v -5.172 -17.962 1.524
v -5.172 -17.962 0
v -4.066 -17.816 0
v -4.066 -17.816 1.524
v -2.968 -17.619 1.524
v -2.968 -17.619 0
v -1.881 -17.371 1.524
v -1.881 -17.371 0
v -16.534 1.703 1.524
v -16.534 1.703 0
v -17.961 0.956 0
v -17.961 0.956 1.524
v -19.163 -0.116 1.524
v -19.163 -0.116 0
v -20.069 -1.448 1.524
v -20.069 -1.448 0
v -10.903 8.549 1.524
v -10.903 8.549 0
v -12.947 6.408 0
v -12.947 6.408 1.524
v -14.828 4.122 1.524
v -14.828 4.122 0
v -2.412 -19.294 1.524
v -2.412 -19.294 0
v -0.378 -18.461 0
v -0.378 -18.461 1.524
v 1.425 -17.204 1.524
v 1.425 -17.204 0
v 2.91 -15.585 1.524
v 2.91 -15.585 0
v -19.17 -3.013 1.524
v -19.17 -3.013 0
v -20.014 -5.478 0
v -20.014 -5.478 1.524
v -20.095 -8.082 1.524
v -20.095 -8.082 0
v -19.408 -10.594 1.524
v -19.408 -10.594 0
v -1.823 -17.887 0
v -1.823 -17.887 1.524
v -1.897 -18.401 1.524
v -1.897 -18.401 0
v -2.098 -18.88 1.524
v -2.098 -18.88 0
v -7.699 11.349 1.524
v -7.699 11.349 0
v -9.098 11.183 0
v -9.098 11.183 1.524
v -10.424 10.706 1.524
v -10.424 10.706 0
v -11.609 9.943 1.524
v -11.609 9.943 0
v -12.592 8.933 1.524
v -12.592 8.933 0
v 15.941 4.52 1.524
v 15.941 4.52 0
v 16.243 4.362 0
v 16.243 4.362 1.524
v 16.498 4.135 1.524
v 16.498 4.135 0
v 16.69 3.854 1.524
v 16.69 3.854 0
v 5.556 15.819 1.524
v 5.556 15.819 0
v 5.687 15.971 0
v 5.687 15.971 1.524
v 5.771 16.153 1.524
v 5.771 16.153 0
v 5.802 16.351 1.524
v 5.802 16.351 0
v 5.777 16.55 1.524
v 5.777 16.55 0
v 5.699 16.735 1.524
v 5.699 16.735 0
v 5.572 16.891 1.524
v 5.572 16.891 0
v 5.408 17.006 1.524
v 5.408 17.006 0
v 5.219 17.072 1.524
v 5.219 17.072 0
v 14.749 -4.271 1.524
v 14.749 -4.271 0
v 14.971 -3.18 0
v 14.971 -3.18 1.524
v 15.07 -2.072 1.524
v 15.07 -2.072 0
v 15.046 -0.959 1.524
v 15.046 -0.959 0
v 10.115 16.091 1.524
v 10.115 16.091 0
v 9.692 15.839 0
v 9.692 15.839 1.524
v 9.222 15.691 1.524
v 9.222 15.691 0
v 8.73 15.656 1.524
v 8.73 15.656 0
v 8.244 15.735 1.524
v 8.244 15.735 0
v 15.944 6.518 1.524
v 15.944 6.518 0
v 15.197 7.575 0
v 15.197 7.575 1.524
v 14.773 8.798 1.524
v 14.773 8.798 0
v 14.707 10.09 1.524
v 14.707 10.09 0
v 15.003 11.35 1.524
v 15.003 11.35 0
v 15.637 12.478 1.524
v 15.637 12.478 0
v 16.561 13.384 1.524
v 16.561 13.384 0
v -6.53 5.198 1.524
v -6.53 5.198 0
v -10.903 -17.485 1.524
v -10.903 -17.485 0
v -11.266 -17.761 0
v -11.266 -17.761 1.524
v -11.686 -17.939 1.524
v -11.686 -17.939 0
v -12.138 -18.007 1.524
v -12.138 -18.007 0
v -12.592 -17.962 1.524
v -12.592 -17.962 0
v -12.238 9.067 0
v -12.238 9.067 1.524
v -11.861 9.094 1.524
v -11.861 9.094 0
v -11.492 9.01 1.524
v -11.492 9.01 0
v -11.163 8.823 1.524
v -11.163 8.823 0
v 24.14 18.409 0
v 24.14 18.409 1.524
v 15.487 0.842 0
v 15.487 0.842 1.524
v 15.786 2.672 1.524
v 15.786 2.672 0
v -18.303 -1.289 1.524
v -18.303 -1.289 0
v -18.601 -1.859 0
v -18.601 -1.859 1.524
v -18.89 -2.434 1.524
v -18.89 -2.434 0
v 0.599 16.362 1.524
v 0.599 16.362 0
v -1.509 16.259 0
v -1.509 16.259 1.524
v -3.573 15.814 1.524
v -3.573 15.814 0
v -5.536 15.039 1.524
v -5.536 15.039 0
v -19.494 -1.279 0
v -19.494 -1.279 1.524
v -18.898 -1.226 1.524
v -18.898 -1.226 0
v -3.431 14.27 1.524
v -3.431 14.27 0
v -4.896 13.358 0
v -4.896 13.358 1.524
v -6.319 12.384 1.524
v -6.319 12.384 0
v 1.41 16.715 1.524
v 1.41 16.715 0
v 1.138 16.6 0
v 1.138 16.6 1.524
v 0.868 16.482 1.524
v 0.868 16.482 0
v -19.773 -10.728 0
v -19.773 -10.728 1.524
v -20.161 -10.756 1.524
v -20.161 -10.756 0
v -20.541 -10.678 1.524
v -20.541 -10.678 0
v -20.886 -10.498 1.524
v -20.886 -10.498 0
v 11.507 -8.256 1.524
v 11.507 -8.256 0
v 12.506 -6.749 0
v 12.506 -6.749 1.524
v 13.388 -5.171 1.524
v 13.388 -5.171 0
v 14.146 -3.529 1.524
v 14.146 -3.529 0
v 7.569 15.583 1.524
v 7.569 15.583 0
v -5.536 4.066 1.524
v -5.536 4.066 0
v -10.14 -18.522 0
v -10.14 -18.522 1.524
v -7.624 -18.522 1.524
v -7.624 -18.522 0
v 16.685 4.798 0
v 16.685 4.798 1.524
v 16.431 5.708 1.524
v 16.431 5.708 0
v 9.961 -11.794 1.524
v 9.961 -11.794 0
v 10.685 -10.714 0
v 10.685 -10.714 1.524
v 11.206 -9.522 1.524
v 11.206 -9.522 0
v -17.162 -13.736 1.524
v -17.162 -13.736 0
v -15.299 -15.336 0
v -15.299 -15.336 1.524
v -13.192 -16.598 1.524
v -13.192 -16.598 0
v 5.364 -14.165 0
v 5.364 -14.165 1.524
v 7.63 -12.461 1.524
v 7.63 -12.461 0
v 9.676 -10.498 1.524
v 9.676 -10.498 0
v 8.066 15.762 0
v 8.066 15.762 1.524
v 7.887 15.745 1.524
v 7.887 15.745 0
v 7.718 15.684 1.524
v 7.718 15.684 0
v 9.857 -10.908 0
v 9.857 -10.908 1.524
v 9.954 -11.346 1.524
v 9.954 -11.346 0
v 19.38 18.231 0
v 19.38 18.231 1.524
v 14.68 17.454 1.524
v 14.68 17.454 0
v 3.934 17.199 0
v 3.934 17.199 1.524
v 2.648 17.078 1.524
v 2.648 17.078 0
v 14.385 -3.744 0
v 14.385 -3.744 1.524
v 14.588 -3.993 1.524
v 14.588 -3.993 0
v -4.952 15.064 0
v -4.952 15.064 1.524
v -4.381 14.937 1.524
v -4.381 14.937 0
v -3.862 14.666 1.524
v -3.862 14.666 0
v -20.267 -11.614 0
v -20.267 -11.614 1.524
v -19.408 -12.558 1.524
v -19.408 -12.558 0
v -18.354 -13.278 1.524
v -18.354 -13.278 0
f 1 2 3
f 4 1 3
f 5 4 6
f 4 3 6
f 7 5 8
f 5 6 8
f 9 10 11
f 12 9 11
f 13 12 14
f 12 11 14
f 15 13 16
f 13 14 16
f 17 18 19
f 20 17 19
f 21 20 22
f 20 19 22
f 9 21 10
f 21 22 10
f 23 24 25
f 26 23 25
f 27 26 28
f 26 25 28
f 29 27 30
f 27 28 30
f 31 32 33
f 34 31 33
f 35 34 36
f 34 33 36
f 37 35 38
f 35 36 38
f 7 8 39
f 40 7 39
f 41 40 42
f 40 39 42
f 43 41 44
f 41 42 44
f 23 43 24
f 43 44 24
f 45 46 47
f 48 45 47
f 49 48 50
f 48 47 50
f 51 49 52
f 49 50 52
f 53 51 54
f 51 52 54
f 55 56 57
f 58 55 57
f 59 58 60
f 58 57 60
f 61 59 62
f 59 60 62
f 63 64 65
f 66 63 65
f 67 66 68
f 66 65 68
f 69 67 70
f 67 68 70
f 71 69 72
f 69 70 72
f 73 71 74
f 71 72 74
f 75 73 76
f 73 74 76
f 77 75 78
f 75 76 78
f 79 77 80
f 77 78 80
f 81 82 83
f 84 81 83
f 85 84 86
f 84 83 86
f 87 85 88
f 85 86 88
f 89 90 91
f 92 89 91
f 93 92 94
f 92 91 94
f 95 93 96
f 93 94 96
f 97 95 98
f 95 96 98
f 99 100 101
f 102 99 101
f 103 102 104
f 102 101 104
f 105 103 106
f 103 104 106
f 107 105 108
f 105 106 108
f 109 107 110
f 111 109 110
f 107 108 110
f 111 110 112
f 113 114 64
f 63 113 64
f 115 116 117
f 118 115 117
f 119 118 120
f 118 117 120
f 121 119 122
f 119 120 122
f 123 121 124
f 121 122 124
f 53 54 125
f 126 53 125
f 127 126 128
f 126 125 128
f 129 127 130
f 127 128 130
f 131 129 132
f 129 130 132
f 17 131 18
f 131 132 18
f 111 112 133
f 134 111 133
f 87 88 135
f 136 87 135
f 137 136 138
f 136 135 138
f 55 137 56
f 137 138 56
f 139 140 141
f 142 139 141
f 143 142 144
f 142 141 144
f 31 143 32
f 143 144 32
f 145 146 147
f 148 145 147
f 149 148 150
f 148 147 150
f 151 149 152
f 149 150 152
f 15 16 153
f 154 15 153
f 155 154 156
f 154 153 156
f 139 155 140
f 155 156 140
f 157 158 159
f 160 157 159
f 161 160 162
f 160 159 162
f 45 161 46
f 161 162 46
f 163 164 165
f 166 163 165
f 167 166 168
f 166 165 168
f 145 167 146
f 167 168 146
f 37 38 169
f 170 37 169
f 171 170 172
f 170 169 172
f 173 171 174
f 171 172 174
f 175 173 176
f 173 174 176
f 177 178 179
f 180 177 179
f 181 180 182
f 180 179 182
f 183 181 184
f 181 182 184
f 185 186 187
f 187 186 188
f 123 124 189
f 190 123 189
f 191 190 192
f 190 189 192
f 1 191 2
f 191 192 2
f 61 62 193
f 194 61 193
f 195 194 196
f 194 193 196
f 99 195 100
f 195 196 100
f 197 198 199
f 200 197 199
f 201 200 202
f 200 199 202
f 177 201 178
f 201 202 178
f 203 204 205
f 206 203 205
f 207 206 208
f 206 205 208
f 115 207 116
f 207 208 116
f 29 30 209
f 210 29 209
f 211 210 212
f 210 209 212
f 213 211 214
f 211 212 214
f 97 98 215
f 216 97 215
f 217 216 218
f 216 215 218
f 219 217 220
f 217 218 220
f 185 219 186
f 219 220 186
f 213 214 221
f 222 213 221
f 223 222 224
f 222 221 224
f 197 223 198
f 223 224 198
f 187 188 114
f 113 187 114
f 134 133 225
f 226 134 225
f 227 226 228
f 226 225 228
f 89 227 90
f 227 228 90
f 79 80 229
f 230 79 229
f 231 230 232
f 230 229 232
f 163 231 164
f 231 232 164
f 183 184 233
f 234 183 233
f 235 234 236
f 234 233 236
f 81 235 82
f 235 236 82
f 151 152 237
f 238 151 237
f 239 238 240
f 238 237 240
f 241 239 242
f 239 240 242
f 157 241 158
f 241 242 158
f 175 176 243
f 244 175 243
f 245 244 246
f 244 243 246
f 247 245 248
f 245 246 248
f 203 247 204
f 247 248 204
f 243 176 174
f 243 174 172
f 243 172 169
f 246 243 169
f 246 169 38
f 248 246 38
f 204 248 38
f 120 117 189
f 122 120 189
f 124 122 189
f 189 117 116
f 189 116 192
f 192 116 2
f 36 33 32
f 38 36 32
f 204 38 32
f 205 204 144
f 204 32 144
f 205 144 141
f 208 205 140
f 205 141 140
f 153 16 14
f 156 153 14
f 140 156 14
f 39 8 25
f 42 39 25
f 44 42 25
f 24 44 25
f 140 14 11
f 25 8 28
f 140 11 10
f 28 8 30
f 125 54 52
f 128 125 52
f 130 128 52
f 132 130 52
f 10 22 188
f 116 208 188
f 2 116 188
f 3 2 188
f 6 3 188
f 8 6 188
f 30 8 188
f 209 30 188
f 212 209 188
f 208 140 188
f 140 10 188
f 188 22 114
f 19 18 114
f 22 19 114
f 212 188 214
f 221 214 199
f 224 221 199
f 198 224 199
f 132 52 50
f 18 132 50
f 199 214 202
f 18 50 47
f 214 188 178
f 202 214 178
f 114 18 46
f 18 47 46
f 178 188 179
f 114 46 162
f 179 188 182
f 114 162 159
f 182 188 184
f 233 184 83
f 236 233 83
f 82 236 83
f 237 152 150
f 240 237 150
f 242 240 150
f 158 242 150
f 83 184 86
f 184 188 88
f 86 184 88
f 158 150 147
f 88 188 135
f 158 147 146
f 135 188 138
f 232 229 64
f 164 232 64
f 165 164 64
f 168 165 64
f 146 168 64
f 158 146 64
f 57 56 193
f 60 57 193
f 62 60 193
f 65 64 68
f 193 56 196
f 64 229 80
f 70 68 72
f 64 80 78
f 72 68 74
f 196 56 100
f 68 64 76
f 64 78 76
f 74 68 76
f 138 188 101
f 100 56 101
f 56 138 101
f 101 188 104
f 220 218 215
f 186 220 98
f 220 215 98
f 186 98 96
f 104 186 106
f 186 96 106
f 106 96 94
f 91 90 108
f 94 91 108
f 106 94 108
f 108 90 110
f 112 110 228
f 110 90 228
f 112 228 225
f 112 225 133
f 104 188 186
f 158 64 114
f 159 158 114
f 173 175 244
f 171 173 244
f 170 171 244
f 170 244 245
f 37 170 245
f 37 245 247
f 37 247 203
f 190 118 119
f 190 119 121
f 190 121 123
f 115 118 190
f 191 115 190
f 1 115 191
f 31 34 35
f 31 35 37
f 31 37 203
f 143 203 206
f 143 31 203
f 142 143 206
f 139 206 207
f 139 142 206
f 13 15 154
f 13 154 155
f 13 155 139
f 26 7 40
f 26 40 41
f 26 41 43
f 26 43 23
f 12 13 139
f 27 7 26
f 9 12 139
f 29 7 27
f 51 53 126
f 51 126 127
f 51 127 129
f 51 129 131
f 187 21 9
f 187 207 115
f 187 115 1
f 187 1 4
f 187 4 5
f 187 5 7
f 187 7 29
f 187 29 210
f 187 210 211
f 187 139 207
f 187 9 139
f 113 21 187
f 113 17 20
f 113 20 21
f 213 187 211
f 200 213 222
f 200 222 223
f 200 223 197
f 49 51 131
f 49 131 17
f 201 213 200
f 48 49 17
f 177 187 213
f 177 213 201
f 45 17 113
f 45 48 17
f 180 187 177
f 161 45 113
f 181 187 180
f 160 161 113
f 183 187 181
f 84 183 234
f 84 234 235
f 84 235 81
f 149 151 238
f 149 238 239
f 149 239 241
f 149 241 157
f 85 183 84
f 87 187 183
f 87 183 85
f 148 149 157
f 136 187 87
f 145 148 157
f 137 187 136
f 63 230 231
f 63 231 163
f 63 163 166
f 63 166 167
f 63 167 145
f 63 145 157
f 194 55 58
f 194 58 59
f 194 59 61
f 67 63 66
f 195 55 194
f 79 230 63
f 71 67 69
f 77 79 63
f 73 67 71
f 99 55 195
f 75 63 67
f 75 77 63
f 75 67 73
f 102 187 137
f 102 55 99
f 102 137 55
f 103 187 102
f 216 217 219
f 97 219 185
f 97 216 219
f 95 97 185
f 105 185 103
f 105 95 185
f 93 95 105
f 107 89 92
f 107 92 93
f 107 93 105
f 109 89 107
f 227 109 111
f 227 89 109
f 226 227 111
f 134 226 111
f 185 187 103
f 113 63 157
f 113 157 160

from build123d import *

# Parameters (mm, degrees)
BOSS_EXTRUDE1_DEPTH = 1.524


with BuildPart() as part:
    # Sketch1 → Boss-Extrude1 (new body)
    with BuildSketch(Plane.XY):
        with BuildLine():
            Line((7.568674397, 15.582558464), (-5.536256919, 4.066414385))
            Line((-5.536256919, 4.066414385), (-6.530313076, 5.198282058))
            Line((-6.530313076, 5.198282058), (5.556223507, 15.819133016))
            ThreePointArc((5.556223507, 15.819133016), (5.777089873, 16.550462951), (5.218621489, 17.071748372))
            ThreePointArc((5.218621489, 17.071748372), (3.288269389, 17.169456569), (1.409525645, 16.715443282))
            ThreePointArc((1.409525645, 16.715443282), (1.003306116, 16.541109193), (0.599038273, 16.362295908))
            ThreePointArc((0.599038273, 16.362295908), (-2.550127925, 16.078915888), (-5.536256919, 15.03940369))
            ThreePointArc((-5.536256919, 15.03940369), (-4.380758941, 14.936898454), (-3.431369122, 14.270308722))
            ThreePointArc((-3.431369122, 14.270308722), (-5.61253751, 12.87862193), (-7.699155785, 11.348814153))
            ThreePointArc((-7.699155785, 11.348814153), (-10.424357394, 10.705874365), (-12.591632165, 8.933019197))
            ThreePointArc((-12.591632165, 8.933019197), (-11.673431217, 9.06564735), (-10.902633402, 8.549358731))
            ThreePointArc((-10.902633402, 8.549358731), (-13.90878858, 5.282464583), (-16.534336918, 1.702511755))
            ThreePointArc((-16.534336918, 1.702511755), (-18.59519403, 0.456840392), (-20.068993111, -1.447561206))
            ThreePointArc((-20.068993111, -1.447561206), (-19.197525413, -1.237616175), (-18.302618639, -1.289333967))
            ThreePointArc((-18.302618639, -1.289333967), (-18.746738742, -2.146015126), (-19.170061319, -3.013161751))
            ThreePointArc((-19.170061319, -3.013161751), (-20.151793191, -6.776607347), (-19.40772228, -10.594156129))
            ThreePointArc((-19.40772228, -10.594156129), (-20.160576804, -10.75613538), (-20.886030658, -10.497786933))
            ThreePointArc((-20.886030658, -10.497786933), (-19.40772228, -12.558219915), (-17.161873617, -13.735905577))
            ThreePointArc((-17.161873617, -13.735905577), (-14.272607306, -16.011724419), (-10.902633402, -17.484981731))
            ThreePointArc((-10.902633402, -17.484981731), (-11.686238888, -17.939086495), (-12.591632165, -17.961707434))
            ThreePointArc((-12.591632165, -17.961707434), (-8.881936241, -18.592642939), (-5.172240316, -17.961707434))
            ThreePointArc((-5.172240316, -17.961707434), (-3.516074533, -17.724342682), (-1.880821012, -17.370544649))
            ThreePointArc((-1.880821012, -17.370544649), (-1.897285647, -18.401111131), (-2.412003394, -19.294085934))
            ThreePointArc((-2.412003394, -19.294085934), (0.557596733, -17.882208081), (2.910422529, -15.585224243))
            ThreePointArc((2.910422529, -15.585224243), (6.522466187, -13.346484728), (9.675834999, -10.497786933))
            ThreePointArc((9.675834999, -10.497786933), (9.916567514, -11.124520652), (9.960567596, -11.794454448))
            ThreePointArc((9.960567596, -11.794454448), (10.971969999, -10.129349123), (11.507200123, -8.256106139))
            ThreePointArc((11.507200123, -8.256106139), (12.962197209, -5.968399457), (14.145957127, -3.529274442))
            ThreePointArc((14.145957127, -3.529274442), (14.491523151, -3.864332581), (14.749497984, -4.270693035))
            ThreePointArc((14.749497984, -4.270693035), (15.035659281, -2.627123404), (15.04635356, -0.958862317))
            ThreePointArc((15.04635356, -0.958862317), (15.654704723, 1.754409987), (15.940567857, 4.520313094))
            ThreePointArc((15.940567857, 4.520313094), (16.377113792, 4.256299615), (16.690299619, 3.853571284))
            ThreePointArc((16.690299619, 3.853571284), (16.588539506, 5.261834916), (15.944497262, 6.518326526))
            ThreePointArc((15.944497262, 6.518326526), (14.706822394, 10.090010141), (16.56074466, 13.384207335))
            Line((16.56074466, 13.384207335), (24.140280678, 18.409177712))
            ThreePointArc((24.140280678, 18.409177712), (17.01748918, 17.916684767), (10.115138619, 16.090687846))
            ThreePointArc((10.115138619, 16.090687846), (9.22182641, 15.690950119), (8.244138062, 15.734795847))
            ThreePointArc((8.244138062, 15.734795847), (7.886999128, 15.744784733), (7.568674397, 15.582558464))
        make_face()
    extrude(amount=BOSS_EXTRUDE1_DEPTH)


solid = part.part
